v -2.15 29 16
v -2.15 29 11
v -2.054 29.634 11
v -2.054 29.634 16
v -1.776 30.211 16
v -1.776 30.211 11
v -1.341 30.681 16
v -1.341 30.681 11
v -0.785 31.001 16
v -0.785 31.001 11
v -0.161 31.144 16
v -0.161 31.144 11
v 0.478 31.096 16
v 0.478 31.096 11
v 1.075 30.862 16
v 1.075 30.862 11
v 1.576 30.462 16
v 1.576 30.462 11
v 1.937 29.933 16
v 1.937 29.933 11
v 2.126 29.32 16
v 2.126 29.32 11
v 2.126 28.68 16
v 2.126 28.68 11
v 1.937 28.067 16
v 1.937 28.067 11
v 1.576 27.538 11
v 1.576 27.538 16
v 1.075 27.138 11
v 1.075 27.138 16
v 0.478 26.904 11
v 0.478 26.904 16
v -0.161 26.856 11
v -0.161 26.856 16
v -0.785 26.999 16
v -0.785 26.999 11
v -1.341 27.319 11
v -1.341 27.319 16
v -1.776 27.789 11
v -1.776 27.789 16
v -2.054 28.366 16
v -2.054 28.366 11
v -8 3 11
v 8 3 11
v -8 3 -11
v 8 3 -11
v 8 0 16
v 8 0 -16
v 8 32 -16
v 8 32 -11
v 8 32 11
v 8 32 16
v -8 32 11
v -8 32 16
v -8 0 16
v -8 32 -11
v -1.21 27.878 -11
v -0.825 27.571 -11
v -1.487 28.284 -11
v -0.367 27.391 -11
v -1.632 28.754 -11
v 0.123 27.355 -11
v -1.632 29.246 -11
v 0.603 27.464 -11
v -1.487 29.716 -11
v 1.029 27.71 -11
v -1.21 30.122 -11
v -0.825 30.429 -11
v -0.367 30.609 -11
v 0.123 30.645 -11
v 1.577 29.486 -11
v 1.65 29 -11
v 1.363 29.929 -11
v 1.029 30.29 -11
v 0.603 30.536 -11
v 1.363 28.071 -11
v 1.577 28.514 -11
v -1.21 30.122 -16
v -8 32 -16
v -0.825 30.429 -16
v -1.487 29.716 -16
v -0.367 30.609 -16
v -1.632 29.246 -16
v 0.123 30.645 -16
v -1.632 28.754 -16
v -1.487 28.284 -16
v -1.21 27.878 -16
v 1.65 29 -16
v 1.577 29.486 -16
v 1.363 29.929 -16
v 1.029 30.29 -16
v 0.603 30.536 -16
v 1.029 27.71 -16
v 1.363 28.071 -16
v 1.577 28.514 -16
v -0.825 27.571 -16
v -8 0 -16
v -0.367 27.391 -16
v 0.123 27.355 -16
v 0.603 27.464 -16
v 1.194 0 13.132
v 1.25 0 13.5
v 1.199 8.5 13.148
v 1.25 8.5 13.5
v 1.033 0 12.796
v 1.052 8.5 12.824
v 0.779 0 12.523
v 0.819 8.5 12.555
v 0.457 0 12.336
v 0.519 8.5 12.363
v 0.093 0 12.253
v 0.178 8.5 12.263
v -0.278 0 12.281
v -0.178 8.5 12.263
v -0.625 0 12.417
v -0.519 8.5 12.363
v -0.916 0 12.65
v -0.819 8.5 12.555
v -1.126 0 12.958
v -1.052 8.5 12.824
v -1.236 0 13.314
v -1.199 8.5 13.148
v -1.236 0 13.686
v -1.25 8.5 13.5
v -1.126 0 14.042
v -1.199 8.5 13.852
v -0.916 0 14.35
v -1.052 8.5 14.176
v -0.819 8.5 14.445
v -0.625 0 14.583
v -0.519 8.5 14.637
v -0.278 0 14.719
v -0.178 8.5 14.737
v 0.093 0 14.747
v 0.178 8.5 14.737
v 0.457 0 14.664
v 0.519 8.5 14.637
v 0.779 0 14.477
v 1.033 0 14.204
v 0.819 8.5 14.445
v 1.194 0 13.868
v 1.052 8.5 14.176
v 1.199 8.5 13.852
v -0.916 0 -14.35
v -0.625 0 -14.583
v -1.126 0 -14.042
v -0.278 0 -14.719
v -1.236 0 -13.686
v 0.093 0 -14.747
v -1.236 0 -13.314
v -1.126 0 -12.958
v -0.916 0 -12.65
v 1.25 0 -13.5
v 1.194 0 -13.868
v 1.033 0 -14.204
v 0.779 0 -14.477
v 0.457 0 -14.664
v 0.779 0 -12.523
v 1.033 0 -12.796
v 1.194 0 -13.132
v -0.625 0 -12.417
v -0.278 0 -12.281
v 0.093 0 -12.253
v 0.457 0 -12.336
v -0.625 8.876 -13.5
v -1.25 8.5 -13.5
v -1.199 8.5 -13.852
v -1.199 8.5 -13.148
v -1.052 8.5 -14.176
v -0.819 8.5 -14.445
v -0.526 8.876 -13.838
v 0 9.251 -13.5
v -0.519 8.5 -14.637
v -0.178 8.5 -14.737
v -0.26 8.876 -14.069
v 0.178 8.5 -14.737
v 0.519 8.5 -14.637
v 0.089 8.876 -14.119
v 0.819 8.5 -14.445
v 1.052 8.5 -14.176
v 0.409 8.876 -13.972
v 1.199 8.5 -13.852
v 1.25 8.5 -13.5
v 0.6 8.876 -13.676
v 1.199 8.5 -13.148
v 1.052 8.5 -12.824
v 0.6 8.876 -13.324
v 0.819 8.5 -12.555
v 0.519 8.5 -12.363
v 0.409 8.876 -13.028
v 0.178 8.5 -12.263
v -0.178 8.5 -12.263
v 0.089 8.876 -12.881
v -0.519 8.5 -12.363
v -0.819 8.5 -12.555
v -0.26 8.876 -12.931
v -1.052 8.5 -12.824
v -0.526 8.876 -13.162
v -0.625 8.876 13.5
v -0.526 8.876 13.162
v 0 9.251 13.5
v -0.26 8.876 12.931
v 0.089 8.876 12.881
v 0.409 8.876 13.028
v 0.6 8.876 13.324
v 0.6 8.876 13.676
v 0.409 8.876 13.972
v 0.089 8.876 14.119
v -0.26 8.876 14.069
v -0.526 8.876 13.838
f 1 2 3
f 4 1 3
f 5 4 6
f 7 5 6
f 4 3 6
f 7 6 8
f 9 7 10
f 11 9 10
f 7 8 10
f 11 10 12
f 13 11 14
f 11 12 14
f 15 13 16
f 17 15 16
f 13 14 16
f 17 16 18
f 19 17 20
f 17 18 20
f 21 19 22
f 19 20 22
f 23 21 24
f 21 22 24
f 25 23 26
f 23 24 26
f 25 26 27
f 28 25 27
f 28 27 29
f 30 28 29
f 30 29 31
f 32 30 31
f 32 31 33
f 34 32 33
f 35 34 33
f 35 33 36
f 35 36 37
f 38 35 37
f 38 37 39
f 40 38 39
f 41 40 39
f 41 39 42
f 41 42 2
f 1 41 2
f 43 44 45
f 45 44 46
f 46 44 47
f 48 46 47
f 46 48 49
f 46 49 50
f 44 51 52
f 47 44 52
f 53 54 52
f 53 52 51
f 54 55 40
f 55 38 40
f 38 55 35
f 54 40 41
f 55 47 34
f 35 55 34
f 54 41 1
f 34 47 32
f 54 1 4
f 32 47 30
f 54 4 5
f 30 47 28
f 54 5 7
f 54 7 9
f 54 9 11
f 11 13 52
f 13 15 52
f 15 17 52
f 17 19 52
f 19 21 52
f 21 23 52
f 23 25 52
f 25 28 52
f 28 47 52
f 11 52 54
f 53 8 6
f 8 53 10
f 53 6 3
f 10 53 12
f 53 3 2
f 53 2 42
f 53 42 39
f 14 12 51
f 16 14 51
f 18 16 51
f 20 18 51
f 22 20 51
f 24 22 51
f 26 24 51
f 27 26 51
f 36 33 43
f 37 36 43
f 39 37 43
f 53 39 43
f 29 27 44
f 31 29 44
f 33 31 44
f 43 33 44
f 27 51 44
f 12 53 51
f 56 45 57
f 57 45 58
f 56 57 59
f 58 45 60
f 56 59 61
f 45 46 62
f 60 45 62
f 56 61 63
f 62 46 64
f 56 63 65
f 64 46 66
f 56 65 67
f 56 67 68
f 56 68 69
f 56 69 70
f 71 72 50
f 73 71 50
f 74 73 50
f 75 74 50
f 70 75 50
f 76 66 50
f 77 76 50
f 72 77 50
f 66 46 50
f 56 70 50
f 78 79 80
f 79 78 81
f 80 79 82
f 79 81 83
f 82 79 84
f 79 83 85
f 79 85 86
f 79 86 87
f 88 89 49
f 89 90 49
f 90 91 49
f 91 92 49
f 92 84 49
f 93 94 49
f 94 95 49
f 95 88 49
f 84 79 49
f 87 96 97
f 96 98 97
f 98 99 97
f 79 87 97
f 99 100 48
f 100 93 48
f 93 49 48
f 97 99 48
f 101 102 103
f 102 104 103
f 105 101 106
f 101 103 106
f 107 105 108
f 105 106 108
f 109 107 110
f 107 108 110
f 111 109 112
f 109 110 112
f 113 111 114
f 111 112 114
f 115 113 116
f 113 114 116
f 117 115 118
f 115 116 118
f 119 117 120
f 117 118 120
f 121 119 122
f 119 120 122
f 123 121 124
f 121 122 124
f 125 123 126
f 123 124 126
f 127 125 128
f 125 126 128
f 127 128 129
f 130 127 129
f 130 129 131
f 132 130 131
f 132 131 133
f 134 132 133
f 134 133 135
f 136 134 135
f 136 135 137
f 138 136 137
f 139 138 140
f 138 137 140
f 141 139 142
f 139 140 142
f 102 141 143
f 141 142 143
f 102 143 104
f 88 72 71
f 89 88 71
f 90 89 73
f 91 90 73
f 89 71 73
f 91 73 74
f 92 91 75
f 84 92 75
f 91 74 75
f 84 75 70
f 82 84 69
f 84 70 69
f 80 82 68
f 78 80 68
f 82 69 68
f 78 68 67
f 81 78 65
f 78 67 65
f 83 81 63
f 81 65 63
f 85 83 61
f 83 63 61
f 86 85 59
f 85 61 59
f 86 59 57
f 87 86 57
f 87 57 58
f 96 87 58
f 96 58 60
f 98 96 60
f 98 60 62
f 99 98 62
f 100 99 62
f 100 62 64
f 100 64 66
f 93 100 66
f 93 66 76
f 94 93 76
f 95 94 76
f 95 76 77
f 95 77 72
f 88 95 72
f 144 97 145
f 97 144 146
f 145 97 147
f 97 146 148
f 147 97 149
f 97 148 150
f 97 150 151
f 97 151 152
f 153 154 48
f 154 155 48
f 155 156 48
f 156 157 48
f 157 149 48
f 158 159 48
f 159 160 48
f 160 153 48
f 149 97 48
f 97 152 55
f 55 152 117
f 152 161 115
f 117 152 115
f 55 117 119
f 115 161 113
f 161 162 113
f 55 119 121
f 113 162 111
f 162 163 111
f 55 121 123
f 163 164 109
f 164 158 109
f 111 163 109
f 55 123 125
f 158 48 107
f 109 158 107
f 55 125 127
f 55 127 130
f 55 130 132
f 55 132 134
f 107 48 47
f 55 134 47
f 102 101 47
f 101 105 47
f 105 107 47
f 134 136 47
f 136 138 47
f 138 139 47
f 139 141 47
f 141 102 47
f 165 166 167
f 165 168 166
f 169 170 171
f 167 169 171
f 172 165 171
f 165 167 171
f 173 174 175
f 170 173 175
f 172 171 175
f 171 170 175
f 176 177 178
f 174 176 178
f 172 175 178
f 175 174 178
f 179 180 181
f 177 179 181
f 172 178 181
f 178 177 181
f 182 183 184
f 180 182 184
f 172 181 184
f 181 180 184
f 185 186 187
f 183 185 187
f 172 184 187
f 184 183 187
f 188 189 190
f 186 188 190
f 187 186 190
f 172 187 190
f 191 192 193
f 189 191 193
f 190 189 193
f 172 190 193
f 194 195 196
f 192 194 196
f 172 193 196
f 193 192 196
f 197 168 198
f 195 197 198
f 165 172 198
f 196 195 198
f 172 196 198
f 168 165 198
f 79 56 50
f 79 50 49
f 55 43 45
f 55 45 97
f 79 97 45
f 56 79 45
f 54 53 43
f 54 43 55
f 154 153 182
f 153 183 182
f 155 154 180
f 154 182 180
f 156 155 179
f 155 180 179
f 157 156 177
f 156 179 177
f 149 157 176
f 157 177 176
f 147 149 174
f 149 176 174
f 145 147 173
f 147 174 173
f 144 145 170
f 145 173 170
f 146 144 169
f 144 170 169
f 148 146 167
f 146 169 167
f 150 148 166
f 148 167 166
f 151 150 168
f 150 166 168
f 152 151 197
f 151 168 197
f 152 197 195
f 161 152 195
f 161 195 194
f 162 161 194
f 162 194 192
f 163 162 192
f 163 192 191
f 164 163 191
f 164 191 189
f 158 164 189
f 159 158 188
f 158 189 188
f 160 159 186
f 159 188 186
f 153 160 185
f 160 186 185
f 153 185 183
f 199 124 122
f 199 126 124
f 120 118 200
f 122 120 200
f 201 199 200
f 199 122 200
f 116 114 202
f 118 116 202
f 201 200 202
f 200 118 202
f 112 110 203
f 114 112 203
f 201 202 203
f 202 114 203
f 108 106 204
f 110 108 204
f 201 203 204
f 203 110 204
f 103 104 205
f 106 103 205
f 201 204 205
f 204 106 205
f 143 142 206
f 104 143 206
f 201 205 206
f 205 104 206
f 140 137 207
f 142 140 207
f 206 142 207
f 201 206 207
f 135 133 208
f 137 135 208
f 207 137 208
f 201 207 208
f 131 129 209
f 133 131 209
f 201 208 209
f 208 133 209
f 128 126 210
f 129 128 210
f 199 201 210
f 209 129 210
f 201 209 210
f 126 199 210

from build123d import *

# Parameters (mm, degrees)
EXTRUDE_1_DEPTH        = 8
HOLE_WIZARD_M4_1_D     = 4.3
HOLE_WIZARD_M4_1_DEPTH = 5
HOLE_WIZARD_M4_1_2_D   = 3.3
HOLE_WIZARD_M3_1_D     = 2.5
HOLE_WIZARD_M3_1_DEPTH = 8.5
HOLE_WIZARD_M3_1_TIP   = 0.751075774


with BuildPart() as part:
    # 草图1 → 凸台-拉伸1 (new, symmetric)
    with BuildSketch(Plane(origin=(0, 0, 0), x_dir=(0, 0, -1), z_dir=(1, 0, 0))):
        Polygon((-11, 32), (-11, 3), (11, 3), (11, 32), (16, 32), (16, 0), (-16, 0), (-16, 32), align=None)
    extrude(amount=EXTRUDE_1_DEPTH, both=True)

    # Hole Wizard M4 _1
    with Locations(Plane.XY.offset(16)):
        with Locations((0, 29)):
            Hole(HOLE_WIZARD_M4_1_D / 2, depth=HOLE_WIZARD_M4_1_DEPTH)

    # Hole Wizard M4 _1 2 (through all)
    with Locations(Plane(origin=(0, 0, -16), x_dir=(-1, 0, 0), z_dir=(0, 0, -1))):
        with Locations((0, 29)):
            Hole(HOLE_WIZARD_M4_1_2_D / 2)

    # M3 螺纹孔1
    with Locations(Plane(origin=(0, 0, 0), x_dir=(-1, 0, 0), z_dir=(0, -1, 0))):
        with Locations((0, 13.5), (0, -13.5)):
            Hole(HOLE_WIZARD_M3_1_D / 2, depth=HOLE_WIZARD_M3_1_DEPTH)
            with Locations((0, 0, -(HOLE_WIZARD_M3_1_DEPTH + HOLE_WIZARD_M3_1_TIP / 2))):  # 118° drill point
                Cone(0, HOLE_WIZARD_M3_1_D / 2, HOLE_WIZARD_M3_1_TIP, mode=Mode.SUBTRACT)


solid = part.part
